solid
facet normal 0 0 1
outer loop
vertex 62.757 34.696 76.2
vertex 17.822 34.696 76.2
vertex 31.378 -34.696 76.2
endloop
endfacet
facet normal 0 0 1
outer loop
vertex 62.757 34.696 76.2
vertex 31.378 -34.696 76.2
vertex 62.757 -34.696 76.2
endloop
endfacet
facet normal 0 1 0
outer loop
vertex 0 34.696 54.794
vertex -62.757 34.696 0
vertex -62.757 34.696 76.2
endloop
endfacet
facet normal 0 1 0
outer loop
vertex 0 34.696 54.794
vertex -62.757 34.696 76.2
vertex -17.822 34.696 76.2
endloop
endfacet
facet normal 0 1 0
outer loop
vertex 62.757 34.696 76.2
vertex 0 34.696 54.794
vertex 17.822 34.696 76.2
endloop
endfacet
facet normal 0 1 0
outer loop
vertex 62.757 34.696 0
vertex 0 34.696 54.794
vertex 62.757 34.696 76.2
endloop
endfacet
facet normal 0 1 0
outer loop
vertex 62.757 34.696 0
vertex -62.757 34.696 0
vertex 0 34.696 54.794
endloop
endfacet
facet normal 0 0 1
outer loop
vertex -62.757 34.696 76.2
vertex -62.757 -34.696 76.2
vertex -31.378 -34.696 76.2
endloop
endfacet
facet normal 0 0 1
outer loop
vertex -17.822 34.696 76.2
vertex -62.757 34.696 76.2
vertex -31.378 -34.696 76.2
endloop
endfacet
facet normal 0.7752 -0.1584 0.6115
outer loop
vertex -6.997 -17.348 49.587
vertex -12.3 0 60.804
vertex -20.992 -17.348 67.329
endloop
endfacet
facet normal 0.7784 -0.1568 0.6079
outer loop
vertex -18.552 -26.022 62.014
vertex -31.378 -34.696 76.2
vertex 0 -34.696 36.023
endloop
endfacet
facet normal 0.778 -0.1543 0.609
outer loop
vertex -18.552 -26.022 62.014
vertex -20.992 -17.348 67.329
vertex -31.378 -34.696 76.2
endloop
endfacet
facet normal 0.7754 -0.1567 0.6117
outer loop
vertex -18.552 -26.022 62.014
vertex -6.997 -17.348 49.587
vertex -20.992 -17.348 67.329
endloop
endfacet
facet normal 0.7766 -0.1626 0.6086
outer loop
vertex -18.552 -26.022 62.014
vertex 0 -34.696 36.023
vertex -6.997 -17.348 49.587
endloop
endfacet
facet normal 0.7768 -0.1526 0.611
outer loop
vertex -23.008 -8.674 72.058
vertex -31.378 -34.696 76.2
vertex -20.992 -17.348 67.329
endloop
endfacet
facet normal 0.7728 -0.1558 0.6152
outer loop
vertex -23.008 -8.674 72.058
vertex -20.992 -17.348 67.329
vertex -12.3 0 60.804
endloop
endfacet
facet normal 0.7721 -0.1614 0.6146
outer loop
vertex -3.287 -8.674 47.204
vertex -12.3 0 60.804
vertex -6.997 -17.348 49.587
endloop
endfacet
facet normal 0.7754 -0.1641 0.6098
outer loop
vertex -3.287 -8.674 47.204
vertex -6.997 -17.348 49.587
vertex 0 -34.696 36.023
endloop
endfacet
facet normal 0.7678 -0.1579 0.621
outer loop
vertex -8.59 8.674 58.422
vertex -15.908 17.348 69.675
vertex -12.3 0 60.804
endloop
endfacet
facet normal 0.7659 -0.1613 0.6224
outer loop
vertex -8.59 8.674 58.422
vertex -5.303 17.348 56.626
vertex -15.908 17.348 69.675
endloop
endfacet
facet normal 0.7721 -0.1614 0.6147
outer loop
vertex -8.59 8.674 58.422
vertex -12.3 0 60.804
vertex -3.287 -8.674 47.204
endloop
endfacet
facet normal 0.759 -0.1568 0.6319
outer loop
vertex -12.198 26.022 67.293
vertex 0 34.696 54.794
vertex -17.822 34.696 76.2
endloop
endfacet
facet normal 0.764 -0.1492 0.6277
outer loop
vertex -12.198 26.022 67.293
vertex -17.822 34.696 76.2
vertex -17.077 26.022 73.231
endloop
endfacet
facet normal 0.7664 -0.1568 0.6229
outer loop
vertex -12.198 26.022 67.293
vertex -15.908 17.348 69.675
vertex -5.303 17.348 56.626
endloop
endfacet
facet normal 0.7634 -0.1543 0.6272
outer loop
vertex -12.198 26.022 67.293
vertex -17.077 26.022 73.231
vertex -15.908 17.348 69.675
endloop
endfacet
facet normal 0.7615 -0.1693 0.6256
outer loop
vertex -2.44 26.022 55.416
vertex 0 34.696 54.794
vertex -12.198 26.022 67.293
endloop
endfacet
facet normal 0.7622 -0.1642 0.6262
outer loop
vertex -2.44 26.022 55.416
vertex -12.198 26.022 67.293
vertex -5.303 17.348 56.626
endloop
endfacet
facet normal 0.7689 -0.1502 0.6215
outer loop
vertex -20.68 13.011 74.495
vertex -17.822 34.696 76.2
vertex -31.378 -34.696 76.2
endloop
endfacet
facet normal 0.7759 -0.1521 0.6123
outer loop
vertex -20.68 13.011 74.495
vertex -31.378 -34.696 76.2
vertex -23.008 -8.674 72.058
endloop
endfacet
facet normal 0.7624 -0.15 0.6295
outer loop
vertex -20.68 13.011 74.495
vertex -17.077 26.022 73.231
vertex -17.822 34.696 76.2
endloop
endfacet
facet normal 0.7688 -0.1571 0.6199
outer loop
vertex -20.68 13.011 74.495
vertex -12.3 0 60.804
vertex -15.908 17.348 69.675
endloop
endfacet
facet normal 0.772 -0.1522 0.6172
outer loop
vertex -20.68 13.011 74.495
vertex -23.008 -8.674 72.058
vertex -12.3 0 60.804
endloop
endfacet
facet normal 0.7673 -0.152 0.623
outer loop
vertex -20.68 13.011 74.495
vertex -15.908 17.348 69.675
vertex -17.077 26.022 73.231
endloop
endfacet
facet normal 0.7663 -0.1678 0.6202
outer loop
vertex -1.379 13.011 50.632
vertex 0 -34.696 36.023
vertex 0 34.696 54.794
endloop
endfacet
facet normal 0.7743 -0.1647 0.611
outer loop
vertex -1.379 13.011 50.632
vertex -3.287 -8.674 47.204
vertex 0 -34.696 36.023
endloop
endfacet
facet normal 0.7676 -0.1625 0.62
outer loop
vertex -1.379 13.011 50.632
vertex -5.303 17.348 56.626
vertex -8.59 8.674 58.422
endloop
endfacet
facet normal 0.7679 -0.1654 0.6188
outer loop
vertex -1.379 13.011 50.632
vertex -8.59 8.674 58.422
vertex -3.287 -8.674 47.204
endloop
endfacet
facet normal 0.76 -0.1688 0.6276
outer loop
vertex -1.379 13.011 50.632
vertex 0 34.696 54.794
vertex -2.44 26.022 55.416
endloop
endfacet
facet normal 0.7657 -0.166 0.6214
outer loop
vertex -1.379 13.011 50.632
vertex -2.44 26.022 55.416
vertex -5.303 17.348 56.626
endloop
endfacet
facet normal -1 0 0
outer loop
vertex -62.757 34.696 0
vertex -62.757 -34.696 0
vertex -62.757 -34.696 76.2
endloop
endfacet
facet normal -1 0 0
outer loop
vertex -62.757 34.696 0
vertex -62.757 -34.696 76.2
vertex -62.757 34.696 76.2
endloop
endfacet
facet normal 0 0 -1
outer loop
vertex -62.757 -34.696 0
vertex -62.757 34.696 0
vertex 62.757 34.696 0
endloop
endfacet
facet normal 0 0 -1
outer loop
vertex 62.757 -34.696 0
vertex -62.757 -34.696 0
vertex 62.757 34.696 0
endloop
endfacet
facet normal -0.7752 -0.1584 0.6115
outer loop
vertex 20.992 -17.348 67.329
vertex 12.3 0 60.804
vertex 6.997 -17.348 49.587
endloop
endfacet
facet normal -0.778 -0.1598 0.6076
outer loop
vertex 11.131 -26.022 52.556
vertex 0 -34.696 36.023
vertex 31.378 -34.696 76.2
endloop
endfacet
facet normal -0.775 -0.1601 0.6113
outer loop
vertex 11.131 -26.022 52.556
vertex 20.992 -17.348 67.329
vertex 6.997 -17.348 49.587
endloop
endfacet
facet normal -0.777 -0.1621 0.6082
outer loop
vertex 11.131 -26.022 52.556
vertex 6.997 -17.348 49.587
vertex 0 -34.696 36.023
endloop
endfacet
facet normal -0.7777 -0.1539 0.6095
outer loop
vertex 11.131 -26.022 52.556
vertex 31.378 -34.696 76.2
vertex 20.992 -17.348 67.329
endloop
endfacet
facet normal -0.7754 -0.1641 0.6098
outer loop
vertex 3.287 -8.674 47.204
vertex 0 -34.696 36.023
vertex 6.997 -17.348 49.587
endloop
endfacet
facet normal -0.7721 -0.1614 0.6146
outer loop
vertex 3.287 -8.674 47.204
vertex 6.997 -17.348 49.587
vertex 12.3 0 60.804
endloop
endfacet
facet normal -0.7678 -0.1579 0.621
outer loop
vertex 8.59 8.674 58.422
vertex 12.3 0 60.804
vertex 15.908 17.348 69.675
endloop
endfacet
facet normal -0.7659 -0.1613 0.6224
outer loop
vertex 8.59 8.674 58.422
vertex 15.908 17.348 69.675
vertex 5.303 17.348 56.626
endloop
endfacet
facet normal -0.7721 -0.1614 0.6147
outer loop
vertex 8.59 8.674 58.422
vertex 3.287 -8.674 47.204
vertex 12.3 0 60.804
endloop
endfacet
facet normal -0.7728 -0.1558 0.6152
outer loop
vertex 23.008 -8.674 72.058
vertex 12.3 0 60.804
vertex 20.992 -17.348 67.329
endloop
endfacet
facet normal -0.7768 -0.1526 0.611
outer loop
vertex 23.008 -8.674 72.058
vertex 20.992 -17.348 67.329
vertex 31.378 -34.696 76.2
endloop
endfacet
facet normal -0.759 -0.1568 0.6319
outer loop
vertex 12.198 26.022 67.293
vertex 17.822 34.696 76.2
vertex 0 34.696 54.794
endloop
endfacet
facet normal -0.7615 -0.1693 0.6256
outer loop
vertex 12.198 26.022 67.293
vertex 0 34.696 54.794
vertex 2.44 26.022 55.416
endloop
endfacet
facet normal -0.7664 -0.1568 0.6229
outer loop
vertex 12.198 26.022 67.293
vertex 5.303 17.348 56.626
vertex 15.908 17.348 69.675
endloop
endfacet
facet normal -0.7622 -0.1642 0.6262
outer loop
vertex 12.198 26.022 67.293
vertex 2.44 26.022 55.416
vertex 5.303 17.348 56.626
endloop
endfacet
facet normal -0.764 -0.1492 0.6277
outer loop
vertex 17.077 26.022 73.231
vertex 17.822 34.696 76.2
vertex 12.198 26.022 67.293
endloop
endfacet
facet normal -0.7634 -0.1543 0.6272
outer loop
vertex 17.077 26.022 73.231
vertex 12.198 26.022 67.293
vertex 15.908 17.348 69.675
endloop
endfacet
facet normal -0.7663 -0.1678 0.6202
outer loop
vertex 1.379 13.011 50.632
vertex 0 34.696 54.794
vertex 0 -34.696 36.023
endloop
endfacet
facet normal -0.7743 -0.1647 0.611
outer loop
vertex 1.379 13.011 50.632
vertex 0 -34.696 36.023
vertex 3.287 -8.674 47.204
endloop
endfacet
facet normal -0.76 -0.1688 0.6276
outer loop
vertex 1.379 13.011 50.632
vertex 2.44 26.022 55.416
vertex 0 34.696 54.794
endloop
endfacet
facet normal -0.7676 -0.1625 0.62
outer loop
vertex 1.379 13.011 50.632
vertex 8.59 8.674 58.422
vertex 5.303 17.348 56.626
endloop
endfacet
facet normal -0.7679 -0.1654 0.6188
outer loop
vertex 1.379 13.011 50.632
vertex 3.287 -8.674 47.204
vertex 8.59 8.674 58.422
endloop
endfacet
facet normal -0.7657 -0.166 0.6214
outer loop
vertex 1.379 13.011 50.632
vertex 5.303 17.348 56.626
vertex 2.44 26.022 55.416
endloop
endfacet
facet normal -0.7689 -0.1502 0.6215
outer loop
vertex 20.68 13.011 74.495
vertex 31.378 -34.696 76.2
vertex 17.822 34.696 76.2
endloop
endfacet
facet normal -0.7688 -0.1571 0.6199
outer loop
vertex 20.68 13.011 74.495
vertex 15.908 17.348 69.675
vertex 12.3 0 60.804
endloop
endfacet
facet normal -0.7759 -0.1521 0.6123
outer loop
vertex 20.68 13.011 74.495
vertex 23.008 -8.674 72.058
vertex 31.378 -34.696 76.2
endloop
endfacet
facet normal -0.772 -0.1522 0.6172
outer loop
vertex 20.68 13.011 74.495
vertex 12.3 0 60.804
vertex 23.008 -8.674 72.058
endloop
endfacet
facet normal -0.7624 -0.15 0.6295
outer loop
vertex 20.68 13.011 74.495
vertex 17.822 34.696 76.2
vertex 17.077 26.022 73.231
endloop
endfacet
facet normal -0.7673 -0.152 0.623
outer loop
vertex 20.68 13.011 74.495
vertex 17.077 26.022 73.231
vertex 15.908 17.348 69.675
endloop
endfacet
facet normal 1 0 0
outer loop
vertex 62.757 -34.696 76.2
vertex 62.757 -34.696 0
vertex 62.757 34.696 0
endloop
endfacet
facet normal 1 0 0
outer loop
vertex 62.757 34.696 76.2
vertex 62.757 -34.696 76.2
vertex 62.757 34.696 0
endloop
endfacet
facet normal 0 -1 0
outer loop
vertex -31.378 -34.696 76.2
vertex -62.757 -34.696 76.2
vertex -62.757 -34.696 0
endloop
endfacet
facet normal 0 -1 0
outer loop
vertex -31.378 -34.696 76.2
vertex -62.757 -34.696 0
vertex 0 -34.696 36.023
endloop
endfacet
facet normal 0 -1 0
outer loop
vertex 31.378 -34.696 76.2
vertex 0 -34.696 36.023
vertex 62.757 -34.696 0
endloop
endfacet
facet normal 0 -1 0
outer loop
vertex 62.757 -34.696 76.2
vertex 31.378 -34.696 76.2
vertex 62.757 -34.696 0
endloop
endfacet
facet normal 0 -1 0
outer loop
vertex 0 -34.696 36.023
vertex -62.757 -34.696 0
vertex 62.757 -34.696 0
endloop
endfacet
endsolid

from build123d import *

# Parameters (mm, degrees)
F0_W     = 125.5133152008
F0_H     = 69.3925619125
F1_DEPTH = 76.2


with BuildPart() as f1:
    # F0 (on Top) → F1 (new body)
    with BuildSketch(Plane.XY):
        Rectangle(F0_W, F0_H)
    extrude(amount=F1_DEPTH)

    # F2 (on face) → F4 section 0
    with BuildSketch(Plane.XZ.offset(34.6962809563)):
        Polygon((31.3783288002, 76.2), (0, 76.2), (-31.3783288002, 76.2), (0, 36.0234603286), align=None)
    # F3 (on face) → F4 section 1
    with BuildSketch(Plane(origin=(0, 34.6962809563, 0), x_dir=(-1, 0, 0), z_dir=(0, 1, 0))):
        Polygon((0, 76.2), (-17.8221333772, 76.2), (0, 54.7935776412), (17.8221333772, 76.2), align=None)
    loft(mode=Mode.SUBTRACT)


solid = f1.part
